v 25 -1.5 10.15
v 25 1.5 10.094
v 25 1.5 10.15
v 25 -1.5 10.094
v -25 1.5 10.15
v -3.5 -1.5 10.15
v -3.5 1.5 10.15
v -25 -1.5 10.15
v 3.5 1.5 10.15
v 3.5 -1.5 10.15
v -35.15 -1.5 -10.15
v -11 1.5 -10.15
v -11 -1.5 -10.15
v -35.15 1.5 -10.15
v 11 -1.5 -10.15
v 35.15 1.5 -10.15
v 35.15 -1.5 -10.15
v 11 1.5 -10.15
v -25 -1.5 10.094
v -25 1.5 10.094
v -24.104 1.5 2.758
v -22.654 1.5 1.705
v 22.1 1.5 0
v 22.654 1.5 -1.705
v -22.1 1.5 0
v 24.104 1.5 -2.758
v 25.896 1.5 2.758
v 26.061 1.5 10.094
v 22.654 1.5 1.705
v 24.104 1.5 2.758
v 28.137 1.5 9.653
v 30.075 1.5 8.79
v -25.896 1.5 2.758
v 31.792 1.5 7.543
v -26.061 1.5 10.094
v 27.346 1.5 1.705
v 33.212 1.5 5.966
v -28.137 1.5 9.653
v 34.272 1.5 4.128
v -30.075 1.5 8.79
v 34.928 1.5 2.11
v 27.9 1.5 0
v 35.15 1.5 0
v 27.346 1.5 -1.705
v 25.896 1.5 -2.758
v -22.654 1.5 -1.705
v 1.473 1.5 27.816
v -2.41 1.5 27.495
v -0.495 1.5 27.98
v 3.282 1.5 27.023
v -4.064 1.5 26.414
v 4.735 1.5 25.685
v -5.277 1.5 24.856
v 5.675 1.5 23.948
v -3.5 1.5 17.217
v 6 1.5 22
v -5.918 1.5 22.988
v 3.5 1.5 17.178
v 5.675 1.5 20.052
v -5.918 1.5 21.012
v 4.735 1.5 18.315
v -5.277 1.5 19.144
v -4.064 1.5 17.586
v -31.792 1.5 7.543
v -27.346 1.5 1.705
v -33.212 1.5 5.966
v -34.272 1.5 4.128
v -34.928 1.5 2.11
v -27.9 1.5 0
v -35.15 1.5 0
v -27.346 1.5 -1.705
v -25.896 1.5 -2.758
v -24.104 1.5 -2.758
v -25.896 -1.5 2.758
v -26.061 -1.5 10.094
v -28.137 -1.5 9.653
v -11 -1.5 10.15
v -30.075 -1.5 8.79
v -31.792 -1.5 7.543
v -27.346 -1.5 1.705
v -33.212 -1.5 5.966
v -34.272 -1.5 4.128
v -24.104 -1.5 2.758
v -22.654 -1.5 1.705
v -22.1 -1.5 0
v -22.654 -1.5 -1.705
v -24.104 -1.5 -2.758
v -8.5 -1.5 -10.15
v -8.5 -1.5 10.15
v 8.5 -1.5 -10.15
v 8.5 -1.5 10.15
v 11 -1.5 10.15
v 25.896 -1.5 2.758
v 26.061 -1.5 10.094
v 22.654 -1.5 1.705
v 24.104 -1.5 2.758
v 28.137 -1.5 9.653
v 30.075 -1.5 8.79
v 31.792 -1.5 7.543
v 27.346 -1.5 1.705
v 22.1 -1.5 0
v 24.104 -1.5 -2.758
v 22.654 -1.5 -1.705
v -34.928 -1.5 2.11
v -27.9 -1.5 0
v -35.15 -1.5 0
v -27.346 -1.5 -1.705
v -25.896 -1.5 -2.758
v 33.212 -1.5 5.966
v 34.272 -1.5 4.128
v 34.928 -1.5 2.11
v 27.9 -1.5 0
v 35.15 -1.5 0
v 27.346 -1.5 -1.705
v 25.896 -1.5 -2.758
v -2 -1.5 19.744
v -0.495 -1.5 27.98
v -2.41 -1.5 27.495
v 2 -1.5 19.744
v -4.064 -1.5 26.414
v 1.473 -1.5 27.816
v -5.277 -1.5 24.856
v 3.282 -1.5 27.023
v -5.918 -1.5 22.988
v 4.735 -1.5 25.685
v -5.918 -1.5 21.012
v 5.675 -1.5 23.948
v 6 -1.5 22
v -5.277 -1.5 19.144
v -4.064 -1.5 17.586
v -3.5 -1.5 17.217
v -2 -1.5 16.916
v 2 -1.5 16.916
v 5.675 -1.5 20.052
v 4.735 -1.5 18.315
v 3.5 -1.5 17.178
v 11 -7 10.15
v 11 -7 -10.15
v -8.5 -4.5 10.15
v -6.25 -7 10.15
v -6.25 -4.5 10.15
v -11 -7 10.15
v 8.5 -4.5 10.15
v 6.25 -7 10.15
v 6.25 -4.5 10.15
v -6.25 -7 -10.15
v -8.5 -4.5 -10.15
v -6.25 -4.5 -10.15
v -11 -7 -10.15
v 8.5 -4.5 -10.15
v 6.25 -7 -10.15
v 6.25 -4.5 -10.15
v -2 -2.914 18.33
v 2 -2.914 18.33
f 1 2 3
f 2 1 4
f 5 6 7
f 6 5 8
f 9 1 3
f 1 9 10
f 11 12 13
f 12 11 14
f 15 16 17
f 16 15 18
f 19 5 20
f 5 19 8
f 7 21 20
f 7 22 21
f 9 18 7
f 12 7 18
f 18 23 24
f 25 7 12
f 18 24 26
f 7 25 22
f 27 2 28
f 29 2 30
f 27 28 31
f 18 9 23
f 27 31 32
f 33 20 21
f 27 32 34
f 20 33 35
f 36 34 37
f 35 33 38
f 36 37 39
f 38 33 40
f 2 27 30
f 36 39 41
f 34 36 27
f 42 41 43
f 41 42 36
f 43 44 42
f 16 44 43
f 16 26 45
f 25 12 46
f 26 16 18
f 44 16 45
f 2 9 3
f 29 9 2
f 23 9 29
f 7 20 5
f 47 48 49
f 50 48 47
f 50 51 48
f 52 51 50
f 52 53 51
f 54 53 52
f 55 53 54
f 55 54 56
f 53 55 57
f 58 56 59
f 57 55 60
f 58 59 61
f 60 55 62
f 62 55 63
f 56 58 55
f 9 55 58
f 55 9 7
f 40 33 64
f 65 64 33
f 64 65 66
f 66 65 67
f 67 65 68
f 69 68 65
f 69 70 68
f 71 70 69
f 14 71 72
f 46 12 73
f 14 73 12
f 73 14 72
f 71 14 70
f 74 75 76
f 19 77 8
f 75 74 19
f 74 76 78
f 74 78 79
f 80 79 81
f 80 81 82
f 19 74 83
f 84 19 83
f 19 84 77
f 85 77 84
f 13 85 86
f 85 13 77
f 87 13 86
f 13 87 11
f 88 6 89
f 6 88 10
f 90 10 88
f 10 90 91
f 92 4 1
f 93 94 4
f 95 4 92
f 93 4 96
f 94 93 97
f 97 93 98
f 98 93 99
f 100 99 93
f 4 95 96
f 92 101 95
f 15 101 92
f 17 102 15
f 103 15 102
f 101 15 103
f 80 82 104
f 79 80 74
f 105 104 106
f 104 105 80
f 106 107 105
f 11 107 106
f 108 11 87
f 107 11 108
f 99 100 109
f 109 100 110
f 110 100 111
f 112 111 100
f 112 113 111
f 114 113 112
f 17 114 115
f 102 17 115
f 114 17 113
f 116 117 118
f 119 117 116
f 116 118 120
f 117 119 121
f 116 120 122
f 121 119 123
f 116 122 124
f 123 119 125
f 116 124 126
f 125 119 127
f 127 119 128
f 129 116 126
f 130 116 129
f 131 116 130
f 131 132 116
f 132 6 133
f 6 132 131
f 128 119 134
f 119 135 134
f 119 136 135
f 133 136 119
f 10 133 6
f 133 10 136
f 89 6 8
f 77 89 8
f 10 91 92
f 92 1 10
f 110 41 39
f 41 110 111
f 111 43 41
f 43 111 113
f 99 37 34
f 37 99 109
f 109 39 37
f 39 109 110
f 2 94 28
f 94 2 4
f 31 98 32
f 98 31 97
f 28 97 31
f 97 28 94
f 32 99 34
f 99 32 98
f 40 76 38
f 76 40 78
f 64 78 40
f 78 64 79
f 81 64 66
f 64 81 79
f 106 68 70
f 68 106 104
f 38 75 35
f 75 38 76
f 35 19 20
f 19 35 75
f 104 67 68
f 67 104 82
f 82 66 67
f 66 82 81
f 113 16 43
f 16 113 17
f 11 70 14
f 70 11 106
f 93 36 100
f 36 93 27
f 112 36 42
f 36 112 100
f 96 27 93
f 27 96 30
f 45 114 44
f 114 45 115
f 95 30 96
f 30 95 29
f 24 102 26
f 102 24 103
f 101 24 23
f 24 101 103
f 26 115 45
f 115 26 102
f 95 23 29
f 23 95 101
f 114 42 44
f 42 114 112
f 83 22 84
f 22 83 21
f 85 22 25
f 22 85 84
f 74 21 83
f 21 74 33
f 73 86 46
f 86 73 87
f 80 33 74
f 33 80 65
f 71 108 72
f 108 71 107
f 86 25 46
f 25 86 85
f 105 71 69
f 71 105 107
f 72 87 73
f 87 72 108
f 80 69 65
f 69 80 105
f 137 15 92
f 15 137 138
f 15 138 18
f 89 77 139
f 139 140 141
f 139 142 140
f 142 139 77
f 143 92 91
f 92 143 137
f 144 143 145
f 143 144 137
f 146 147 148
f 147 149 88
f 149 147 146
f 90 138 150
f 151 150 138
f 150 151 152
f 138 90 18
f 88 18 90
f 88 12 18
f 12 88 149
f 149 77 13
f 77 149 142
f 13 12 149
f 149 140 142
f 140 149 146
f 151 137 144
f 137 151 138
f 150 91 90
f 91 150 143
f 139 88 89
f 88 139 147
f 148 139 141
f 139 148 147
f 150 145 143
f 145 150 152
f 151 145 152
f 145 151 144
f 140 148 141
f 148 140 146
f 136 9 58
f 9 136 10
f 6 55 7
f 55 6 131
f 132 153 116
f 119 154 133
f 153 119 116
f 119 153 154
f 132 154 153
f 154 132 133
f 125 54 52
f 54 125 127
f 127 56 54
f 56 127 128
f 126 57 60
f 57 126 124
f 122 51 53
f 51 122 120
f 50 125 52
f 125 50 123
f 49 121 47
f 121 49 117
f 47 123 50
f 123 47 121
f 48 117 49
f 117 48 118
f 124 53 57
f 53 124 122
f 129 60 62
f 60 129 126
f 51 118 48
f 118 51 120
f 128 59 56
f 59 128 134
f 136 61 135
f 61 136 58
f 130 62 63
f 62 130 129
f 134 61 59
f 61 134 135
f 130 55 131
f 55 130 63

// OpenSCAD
/*

Adapter for bike light to rack
Gian Pablo Villamil
May 30, 2011

*/

// TODO: Print again, testing the -1.5 change in release dimple.

bracket_height = 20.3;
tongue_width = 17;
tongue_thickness = 3;
base_width = 12.5;
base_thickness = 2.5;
side_thickness = 2.5;

plate_thickness = 3;
plate_width = 100;
plate_height = 20.3;

hole_dia = 5.8 ;
hole_sep = 50 ;

module plate() {
	difference() {
		union() {
			cube(size= [hole_sep, plate_thickness, plate_height], center = true);
			translate ([hole_sep/2,0,0]) rotate (a = 90, v = [1,0,0]) 
				cylinder(h = plate_thickness, r = plate_height/2, center = true);
			translate ([-hole_sep/2,0,0]) rotate (a = 90, v = [1,0,0]) 
				cylinder(h = plate_thickness, r = plate_height/2, center = true);
			translate ([hole_sep/2+plate_height/4,0,-plate_height/4])
				cube(size = [plate_height/2,plate_thickness,plate_height/2],center = true);
			translate ([-(hole_sep/2+plate_height/4),0,-plate_height/4])
				cube(size = [plate_height/2,plate_thickness,plate_height/2],center = true);

		}
		translate ([hole_sep/2,0,0]) rotate (a = 90, v = [1,0,0]) 
			cylinder(h = plate_thickness+2, r = hole_dia/2, center = true);
		translate ([-hole_sep/2,0,0]) rotate (a = 90, v = [1,0,0]) 
			cylinder(h = plate_thickness+2, r = hole_dia/2, center = true);
	};
};

module bracket() {
	difference(){
		translate([-(tongue_width+(side_thickness *2))/2,0,0])
		cube(size = [tongue_width+(side_thickness * 2),plate_thickness+tongue_thickness+base_thickness, bracket_height], center = false);
		translate([-tongue_width/2,2.5,0])
		cube(size = [tongue_width, tongue_thickness, bracket_height], center=false);
		translate([-base_width/2,0,0])
		cube(size = [base_width, base_thickness, bracket_height], center=false);
	};
};

module release() {
	union() {
		translate([-3.5,-plate_thickness/2,0])
		#cube(size = [7, plate_thickness, 10], center = false);
		translate([0,-1.5,8.33]) rotate(a = 45, v = [1,0,0])
		cube(size = [4,2,2], center = true);
		translate([0,plate_thickness/2,12]) rotate(a = 90, v = [1,0,0])
		cylinder(h = plate_thickness, r = 6);
	};
}


union() {
plate();
translate([0,-7,-plate_height/2])
bracket();}
translate([0,0,10])
release();
